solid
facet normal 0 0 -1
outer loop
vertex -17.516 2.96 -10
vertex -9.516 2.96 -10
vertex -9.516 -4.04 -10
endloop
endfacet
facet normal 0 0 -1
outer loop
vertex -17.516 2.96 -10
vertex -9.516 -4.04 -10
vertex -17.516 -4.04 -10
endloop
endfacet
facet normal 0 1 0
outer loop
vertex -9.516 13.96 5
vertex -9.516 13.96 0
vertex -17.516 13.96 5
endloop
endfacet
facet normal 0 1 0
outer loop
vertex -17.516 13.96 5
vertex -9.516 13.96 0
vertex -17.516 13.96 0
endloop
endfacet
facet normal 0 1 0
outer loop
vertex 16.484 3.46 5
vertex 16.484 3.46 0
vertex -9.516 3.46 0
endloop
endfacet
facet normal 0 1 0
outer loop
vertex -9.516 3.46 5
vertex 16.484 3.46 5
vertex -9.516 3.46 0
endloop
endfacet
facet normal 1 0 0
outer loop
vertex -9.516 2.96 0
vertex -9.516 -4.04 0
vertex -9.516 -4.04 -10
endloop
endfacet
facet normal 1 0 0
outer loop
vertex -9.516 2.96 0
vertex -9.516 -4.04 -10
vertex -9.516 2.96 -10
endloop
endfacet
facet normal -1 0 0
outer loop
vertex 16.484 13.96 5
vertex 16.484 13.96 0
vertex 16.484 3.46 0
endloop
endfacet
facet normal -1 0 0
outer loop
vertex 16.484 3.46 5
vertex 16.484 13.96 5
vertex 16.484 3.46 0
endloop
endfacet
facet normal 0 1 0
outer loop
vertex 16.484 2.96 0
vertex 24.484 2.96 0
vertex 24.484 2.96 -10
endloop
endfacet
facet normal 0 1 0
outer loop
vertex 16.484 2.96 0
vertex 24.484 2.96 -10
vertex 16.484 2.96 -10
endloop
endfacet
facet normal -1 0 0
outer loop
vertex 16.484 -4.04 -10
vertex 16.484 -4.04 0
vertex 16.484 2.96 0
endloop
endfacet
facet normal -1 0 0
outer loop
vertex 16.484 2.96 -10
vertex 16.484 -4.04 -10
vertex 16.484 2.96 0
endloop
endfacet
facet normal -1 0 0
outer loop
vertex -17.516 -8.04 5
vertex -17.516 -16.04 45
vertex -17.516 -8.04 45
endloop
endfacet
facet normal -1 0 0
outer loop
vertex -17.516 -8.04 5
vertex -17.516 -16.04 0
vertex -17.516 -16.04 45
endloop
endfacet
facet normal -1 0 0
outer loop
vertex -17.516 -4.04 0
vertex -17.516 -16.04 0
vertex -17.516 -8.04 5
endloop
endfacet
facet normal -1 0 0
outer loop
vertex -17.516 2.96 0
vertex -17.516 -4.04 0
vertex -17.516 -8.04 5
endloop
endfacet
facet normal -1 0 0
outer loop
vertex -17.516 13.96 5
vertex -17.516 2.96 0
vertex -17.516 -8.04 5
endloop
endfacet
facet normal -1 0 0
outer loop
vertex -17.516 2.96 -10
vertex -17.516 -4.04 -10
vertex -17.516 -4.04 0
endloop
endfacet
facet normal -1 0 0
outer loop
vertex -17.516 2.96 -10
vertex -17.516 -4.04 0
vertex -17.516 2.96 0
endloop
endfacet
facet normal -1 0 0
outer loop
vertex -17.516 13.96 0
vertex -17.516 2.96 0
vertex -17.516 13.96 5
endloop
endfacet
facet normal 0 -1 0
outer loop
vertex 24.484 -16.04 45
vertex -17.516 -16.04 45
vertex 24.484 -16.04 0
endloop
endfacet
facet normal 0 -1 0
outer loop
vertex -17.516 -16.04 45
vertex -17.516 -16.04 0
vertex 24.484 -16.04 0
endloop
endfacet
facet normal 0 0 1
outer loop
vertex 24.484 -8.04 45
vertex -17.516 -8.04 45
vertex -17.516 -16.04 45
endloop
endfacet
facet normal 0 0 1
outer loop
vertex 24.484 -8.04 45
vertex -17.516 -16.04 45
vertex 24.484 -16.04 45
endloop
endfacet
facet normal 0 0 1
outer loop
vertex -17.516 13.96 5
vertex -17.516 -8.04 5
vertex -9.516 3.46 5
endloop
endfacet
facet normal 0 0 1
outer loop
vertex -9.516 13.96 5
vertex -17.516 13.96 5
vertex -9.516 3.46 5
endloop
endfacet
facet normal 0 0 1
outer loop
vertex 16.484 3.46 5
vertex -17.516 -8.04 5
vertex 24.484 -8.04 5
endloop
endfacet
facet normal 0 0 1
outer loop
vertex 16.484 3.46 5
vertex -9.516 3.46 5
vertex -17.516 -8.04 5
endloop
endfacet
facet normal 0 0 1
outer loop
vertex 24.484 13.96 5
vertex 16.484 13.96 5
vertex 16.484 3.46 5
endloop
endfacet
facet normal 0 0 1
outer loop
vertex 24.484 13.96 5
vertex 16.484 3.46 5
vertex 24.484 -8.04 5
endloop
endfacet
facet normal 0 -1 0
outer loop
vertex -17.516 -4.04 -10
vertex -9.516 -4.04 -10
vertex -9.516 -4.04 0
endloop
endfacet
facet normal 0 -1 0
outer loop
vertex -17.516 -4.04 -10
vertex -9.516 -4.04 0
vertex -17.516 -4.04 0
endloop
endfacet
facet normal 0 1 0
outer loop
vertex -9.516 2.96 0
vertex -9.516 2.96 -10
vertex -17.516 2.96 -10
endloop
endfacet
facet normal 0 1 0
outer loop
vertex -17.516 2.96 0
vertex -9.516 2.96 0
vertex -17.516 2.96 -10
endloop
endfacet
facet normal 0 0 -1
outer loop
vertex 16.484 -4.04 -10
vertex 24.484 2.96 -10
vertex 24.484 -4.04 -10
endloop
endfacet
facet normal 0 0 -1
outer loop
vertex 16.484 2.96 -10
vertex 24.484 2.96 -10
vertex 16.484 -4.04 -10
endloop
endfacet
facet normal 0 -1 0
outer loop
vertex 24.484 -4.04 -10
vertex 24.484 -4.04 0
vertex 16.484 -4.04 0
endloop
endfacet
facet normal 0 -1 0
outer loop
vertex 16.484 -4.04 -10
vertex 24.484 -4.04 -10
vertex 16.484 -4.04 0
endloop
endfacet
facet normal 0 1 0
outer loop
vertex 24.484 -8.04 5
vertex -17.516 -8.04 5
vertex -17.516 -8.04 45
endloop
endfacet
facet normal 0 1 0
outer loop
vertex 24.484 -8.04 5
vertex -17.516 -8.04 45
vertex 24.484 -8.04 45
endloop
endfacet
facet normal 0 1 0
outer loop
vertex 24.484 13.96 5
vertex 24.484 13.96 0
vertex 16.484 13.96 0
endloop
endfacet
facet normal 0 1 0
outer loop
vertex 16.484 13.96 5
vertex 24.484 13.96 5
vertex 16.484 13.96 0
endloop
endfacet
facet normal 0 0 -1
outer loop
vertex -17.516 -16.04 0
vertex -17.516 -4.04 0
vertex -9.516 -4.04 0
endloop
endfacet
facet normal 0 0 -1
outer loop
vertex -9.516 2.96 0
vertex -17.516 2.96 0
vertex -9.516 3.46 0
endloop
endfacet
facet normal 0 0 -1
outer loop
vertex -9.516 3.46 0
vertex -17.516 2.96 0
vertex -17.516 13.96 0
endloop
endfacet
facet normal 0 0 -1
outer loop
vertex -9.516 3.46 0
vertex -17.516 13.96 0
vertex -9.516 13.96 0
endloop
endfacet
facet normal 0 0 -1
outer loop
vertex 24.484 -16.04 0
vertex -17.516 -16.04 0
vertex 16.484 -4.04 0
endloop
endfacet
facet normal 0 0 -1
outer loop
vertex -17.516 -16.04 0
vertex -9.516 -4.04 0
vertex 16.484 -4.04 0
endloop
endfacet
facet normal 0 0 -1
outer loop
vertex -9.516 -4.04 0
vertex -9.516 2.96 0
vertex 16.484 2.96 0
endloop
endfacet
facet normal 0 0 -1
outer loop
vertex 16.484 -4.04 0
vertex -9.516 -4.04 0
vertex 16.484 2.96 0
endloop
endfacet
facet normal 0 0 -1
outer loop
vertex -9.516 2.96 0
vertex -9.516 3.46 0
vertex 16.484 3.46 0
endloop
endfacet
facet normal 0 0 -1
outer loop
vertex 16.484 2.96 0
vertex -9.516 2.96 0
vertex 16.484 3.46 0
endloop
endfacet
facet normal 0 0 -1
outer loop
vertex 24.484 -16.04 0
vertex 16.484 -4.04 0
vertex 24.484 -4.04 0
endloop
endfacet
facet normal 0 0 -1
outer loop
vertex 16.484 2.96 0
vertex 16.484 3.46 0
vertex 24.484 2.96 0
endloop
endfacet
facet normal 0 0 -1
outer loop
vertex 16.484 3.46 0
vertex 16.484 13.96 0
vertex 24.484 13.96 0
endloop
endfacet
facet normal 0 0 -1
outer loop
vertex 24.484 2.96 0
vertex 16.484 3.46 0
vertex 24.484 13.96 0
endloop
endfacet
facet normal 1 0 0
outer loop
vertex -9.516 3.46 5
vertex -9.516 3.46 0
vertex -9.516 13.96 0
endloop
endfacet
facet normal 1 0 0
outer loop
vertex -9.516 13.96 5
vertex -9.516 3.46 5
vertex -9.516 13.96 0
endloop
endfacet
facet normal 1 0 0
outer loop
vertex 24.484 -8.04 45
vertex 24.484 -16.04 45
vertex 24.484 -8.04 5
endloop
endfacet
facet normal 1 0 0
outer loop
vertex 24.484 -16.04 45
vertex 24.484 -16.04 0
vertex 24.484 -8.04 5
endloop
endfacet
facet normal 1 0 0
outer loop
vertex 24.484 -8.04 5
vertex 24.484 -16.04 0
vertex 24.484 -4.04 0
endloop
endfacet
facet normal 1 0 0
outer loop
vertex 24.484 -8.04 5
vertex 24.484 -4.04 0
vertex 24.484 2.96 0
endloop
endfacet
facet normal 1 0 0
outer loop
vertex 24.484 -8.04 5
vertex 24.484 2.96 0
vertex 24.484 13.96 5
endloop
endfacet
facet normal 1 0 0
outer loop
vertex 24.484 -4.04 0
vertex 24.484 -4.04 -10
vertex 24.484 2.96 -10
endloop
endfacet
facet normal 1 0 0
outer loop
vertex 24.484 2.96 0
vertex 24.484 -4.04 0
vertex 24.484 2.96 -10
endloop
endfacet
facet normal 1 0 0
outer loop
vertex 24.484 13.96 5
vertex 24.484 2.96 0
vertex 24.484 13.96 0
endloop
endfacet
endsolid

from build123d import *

# Parameters (mm, degrees)
BOSS_EXTRUDE1_DEPTH = 5
SKETCH2_W           = 8
SKETCH2_H           = 7
BOSS_EXTRUDE2_DEPTH = 10
SKETCH3_W           = 42
SKETCH3_H           = 8
BOSS_EXTRUDE3_DEPTH = 40


with BuildPart() as part:
    # Sketch1 → Boss-Extrude1 (new body)
    with BuildSketch(Plane.XY):
        Polygon((-17.516022594, -16.039535536), (24.483977406, -16.039535536), (24.483977406, 13.960464464), (16.483977406, 13.960464464), (16.483977406, 3.460464464), (-9.516022594, 3.460464464), (-9.516022594, 13.960464464), (-17.516022594, 13.960464464), align=None)
    extrude(amount=BOSS_EXTRUDE1_DEPTH)

    # Sketch2 → Boss-Extrude2 (add)
    with BuildSketch(Plane(origin=(0, 0, 0), x_dir=(-1, 0, 0), z_dir=(0, 0, -1))):
        with Locations((-20.483977406, -0.539535536)):
            Rectangle(SKETCH2_W, SKETCH2_H)
        with Locations((13.516022594, -0.539535536)):
            Rectangle(SKETCH2_W, SKETCH2_H)
    extrude(amount=BOSS_EXTRUDE2_DEPTH)

    # Sketch3 → Boss-Extrude3 (add)
    with BuildSketch(Plane.XY.offset(5)):
        with Locations((3.483977406, -12.039535536)):
            Rectangle(SKETCH3_W, SKETCH3_H)
    extrude(amount=BOSS_EXTRUDE3_DEPTH)


solid = part.part
